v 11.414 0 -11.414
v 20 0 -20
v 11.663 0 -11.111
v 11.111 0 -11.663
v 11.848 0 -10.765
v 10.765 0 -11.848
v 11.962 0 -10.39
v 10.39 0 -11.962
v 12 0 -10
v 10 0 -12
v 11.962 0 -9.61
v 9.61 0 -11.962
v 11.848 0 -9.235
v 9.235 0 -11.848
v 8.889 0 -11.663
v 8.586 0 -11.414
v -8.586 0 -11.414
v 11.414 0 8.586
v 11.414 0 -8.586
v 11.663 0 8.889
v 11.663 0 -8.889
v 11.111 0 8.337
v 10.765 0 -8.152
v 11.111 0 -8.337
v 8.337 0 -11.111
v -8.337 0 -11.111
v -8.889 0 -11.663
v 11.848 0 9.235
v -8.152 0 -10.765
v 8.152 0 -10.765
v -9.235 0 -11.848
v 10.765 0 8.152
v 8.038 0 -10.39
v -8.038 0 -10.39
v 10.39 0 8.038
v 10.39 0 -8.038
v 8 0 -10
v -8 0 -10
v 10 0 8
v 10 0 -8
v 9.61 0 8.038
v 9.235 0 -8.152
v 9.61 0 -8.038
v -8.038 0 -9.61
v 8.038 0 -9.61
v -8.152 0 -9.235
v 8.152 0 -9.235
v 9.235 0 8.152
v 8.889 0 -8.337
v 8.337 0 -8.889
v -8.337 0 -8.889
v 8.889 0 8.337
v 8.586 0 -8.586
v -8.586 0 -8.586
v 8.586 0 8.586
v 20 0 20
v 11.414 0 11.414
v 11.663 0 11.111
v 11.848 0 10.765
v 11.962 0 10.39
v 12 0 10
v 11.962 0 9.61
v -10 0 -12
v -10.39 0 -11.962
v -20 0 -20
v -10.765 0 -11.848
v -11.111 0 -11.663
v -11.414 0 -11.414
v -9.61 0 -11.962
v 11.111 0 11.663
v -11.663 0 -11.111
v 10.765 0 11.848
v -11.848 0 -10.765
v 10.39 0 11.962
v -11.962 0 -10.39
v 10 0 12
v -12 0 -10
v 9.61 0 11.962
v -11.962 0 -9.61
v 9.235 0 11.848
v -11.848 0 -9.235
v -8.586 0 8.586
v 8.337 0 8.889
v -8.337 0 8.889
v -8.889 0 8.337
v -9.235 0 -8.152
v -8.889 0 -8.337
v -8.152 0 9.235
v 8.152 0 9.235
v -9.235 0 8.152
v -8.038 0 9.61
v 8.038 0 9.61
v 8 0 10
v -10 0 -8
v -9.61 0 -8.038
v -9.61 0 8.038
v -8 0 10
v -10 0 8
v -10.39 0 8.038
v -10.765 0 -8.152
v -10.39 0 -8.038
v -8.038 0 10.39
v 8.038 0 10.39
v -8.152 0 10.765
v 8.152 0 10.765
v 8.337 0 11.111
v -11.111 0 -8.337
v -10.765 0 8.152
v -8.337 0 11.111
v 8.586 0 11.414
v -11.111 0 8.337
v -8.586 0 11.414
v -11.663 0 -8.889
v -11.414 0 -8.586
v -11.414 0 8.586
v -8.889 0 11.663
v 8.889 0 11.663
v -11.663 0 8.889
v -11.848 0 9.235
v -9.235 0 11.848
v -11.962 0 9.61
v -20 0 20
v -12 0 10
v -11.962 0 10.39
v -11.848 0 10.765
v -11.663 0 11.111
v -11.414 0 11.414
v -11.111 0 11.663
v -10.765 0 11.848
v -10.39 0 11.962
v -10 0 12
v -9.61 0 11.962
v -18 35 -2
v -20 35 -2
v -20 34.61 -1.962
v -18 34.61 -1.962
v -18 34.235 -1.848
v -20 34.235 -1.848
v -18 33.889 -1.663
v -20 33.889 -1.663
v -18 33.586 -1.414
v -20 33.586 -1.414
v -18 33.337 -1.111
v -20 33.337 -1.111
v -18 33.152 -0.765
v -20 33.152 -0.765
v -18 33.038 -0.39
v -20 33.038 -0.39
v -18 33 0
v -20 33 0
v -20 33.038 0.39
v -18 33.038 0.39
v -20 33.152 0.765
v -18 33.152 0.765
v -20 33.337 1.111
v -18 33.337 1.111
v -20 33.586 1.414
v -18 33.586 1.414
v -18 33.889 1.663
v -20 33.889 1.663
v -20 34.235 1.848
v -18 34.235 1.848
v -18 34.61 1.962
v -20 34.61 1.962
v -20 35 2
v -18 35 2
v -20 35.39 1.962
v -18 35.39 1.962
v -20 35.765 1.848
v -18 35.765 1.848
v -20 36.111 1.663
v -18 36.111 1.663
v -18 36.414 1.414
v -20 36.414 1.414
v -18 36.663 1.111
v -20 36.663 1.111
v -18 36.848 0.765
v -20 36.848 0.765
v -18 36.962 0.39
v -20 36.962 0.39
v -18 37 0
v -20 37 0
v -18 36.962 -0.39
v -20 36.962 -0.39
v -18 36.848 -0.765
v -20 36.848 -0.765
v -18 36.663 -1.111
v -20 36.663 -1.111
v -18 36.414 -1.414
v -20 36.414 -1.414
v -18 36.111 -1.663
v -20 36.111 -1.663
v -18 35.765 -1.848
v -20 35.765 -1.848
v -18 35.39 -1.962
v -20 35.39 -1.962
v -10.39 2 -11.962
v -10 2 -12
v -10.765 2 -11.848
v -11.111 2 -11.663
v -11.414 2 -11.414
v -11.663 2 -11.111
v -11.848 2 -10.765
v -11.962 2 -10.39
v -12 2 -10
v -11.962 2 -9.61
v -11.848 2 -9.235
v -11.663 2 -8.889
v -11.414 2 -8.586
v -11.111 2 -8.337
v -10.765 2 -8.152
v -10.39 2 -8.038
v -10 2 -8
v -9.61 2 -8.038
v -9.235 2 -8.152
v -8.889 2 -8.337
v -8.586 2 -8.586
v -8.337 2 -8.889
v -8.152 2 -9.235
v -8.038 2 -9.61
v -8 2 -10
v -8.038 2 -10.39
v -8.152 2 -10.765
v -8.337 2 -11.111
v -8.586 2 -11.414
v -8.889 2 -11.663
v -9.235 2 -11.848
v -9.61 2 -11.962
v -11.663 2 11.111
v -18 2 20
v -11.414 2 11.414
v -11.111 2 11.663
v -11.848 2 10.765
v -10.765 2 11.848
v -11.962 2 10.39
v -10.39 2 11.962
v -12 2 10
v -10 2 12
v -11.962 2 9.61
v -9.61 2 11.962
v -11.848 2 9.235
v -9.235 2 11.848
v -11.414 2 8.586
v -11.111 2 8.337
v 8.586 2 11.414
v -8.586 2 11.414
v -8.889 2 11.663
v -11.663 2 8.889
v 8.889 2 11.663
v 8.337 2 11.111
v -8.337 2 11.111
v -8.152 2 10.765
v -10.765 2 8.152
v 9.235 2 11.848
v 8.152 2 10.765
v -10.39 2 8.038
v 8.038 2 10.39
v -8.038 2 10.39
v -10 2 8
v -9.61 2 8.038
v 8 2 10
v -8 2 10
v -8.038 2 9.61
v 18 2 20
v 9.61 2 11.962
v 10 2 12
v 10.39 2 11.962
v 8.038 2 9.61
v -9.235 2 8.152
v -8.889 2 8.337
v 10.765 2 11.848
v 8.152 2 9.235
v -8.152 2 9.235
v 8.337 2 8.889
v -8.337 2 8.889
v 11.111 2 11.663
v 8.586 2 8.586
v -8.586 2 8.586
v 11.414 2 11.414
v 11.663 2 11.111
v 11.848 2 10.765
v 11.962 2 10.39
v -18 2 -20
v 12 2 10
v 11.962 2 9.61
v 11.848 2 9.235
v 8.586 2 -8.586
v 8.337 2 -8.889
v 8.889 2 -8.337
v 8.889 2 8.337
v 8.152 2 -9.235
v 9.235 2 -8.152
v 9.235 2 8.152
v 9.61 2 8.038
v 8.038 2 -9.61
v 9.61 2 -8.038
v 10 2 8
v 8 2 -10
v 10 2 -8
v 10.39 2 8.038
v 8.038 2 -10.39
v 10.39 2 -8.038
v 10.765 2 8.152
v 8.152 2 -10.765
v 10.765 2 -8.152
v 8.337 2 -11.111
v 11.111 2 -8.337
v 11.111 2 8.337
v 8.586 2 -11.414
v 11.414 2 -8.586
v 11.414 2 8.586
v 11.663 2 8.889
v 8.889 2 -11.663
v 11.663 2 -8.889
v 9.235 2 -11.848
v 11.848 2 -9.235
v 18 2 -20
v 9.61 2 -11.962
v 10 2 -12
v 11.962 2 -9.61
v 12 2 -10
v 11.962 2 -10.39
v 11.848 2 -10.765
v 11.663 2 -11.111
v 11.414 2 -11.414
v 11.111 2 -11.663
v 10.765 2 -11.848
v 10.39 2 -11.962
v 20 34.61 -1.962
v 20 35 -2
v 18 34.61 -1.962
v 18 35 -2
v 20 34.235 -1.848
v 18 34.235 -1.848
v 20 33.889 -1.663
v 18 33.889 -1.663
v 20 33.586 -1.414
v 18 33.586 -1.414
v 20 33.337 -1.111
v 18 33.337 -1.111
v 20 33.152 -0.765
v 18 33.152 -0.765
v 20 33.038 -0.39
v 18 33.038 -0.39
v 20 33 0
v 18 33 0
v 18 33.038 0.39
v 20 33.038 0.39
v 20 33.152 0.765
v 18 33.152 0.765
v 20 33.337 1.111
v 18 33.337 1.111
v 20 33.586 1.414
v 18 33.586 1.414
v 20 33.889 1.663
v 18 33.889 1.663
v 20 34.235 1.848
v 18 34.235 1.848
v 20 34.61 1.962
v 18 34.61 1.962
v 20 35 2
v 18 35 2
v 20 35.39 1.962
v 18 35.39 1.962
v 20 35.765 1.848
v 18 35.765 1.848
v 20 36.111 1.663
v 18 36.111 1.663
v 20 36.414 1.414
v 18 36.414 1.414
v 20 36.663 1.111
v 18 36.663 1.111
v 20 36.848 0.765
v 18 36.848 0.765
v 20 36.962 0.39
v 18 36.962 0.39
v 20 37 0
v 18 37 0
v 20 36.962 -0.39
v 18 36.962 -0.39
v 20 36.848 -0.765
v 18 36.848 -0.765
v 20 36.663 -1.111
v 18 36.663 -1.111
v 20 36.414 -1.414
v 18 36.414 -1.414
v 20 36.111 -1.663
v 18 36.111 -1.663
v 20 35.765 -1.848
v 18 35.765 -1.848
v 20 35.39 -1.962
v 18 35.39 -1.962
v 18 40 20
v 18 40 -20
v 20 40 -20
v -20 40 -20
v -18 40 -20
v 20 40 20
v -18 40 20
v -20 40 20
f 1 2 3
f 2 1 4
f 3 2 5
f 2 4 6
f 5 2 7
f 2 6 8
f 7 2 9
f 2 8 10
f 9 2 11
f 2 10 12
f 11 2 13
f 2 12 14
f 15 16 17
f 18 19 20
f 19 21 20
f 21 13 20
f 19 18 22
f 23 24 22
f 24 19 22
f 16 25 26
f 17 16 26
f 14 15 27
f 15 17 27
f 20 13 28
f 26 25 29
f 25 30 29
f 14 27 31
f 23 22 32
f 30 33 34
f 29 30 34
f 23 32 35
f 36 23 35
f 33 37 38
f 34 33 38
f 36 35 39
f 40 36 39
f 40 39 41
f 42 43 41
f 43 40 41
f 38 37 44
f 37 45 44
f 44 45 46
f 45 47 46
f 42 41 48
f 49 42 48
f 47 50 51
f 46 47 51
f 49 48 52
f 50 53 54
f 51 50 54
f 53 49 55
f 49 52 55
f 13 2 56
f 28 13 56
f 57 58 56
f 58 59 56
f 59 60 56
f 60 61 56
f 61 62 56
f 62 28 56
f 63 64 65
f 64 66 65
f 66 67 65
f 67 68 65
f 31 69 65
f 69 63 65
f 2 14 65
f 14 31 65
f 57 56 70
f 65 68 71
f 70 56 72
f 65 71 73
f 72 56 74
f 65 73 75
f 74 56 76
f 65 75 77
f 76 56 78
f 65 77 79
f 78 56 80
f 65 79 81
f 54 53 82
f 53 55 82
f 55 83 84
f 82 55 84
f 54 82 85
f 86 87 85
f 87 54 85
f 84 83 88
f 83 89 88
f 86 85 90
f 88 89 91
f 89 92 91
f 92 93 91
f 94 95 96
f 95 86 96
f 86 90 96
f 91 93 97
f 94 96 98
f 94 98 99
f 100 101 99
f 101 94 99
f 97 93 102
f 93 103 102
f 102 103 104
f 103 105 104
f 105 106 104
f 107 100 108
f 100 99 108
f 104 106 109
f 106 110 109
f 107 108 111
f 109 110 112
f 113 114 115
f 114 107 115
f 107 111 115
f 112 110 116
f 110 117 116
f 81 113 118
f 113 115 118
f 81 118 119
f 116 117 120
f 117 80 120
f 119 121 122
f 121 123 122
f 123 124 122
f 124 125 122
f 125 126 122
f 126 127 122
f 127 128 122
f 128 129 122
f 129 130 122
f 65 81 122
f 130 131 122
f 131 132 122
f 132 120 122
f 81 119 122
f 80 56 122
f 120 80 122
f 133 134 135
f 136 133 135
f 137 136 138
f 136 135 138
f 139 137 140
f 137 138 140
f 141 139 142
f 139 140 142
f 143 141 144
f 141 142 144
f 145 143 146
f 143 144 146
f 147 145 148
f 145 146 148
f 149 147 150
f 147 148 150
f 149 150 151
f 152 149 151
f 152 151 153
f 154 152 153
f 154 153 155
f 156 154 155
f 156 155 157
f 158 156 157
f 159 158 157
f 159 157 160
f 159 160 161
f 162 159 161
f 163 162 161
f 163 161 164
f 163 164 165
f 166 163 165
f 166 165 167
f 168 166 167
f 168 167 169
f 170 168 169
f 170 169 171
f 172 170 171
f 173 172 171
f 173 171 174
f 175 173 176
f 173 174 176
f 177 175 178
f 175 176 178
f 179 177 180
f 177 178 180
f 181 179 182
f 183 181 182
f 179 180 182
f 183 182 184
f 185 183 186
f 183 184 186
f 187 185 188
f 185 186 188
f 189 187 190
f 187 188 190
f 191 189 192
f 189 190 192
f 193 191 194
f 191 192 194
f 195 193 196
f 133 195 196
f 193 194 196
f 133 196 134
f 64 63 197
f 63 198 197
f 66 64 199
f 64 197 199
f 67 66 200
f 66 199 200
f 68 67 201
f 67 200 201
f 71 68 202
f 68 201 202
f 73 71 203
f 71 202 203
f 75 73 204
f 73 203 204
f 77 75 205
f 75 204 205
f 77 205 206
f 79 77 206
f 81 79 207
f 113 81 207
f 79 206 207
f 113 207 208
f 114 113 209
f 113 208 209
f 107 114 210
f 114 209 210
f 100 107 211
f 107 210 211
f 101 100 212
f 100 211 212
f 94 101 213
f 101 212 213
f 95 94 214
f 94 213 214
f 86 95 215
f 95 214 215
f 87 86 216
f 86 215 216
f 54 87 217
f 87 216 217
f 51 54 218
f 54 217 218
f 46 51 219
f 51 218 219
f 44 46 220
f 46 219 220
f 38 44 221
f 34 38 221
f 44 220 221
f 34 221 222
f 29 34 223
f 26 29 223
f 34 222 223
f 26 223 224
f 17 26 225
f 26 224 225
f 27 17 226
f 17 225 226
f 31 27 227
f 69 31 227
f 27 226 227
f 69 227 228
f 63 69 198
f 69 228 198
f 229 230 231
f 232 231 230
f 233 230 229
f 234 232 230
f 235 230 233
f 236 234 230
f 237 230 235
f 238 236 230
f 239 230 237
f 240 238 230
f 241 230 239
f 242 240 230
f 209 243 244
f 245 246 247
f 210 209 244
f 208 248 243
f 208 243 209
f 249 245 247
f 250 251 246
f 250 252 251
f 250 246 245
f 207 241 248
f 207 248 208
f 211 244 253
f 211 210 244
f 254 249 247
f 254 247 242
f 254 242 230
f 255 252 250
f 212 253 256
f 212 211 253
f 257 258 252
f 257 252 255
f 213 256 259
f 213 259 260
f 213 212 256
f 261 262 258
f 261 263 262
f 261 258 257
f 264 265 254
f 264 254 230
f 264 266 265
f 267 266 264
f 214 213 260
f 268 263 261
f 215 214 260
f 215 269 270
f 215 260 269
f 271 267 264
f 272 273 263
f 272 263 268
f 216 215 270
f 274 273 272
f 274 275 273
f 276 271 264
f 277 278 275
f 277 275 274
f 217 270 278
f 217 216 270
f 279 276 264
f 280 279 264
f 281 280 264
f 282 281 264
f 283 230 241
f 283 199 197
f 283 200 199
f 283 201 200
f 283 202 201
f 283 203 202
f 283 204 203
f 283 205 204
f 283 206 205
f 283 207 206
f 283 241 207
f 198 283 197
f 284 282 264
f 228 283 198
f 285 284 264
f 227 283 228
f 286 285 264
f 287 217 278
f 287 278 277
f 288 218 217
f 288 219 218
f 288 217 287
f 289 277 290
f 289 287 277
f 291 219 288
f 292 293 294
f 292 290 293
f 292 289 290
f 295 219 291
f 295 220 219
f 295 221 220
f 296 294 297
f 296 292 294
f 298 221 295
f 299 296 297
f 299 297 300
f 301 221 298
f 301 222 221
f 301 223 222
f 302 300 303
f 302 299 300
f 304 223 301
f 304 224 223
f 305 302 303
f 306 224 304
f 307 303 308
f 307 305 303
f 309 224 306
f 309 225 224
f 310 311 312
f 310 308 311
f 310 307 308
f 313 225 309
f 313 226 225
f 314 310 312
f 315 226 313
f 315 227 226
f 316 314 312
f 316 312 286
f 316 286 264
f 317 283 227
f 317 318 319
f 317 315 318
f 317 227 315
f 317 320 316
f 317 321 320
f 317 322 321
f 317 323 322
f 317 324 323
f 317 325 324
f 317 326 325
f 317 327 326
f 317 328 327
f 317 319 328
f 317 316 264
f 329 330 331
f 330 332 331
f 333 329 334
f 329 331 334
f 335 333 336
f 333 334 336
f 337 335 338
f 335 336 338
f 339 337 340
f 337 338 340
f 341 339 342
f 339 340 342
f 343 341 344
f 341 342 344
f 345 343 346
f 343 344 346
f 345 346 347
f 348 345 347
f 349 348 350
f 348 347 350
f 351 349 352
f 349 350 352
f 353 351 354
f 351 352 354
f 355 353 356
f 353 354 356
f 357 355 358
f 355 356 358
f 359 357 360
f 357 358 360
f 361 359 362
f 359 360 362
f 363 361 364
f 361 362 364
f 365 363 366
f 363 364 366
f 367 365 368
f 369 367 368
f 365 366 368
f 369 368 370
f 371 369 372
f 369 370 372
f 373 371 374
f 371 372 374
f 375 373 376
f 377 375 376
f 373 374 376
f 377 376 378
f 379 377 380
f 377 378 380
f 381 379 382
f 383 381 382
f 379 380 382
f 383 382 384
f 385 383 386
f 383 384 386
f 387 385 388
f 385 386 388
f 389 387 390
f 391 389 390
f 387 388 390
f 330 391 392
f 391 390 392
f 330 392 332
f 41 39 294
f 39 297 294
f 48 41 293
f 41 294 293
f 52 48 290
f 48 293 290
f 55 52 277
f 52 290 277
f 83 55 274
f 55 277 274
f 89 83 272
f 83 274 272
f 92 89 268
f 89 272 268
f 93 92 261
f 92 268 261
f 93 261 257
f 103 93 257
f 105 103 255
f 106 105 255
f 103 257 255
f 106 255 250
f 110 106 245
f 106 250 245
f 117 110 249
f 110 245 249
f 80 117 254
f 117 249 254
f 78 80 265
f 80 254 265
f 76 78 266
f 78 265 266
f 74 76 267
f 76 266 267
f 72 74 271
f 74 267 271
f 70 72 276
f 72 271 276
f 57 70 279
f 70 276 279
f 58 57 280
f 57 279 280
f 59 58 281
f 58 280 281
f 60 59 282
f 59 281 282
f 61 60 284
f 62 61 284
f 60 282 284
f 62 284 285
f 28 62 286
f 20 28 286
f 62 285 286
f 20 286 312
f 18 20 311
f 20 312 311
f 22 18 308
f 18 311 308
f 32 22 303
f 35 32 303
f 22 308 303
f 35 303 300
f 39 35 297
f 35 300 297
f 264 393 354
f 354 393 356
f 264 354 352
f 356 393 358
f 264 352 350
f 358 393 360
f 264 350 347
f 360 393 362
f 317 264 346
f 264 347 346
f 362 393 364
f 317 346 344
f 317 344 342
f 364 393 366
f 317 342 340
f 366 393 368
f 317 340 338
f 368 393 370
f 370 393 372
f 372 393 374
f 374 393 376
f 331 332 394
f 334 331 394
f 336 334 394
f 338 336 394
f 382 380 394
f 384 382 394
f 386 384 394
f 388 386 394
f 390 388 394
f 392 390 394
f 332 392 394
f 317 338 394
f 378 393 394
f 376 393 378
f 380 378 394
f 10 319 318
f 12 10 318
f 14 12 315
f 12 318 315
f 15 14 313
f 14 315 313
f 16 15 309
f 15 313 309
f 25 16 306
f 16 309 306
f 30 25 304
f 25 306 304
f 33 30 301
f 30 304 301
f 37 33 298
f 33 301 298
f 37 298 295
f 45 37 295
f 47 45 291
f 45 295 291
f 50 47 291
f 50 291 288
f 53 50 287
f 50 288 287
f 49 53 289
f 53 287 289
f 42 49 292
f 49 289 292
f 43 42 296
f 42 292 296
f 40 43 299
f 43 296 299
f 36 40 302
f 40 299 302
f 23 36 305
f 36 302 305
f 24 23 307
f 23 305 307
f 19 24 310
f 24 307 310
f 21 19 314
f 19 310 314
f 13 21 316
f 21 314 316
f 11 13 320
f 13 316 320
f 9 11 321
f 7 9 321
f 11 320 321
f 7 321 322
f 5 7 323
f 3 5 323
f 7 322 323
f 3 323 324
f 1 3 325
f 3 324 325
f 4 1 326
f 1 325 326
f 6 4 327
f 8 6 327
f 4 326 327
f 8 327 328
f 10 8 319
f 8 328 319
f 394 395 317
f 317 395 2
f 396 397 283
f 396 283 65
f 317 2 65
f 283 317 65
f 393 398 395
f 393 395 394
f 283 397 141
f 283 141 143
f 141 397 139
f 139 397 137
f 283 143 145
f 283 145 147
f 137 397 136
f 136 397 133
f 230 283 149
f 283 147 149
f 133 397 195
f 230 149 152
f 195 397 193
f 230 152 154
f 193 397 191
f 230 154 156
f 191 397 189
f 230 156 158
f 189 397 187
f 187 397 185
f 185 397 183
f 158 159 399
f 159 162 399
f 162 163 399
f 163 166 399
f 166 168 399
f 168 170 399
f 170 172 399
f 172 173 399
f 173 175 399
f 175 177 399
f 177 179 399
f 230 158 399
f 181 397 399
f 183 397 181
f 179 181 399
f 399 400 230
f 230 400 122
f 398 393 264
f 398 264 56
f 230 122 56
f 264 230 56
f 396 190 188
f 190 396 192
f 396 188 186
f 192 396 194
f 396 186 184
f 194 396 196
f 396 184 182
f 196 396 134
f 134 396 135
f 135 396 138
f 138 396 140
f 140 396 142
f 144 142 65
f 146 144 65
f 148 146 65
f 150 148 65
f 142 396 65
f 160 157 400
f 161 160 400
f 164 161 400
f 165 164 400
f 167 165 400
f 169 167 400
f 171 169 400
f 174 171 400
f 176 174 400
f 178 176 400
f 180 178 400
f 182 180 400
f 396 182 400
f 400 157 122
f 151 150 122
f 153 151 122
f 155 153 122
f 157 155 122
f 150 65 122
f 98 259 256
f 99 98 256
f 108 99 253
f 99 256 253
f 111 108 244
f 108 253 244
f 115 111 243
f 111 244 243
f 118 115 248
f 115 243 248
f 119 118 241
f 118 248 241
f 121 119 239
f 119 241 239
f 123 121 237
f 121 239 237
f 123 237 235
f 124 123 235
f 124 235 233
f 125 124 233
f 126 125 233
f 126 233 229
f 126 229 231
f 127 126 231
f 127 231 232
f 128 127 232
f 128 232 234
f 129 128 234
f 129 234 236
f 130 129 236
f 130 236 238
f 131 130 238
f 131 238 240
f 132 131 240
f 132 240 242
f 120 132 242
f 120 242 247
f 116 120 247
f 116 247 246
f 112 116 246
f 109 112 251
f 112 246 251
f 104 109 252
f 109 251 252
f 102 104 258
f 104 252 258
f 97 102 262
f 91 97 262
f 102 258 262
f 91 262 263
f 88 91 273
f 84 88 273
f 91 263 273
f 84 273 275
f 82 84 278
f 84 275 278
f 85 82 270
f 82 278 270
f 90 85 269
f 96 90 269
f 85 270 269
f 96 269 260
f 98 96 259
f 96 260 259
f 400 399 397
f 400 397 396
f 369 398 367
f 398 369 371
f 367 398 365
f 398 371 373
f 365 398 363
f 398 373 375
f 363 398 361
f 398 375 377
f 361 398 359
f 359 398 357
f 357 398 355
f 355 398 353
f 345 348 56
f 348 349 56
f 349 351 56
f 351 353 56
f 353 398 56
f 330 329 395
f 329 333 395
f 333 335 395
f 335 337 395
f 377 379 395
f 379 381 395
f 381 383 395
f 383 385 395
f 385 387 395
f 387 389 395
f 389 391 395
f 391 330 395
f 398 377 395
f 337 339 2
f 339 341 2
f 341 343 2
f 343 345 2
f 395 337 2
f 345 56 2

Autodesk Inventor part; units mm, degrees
ref_plane "YZ Plane" through (0, 0, 0) normal (1, 0, 0) x (0, 1, 0)
ref_plane "XZ Plane" through (0, 0, 0) normal (0, 1, 0) x (-1, 0, 0)
ref_plane "XY Plane" through (0, 0, 0) normal (0, 0, 1) x (1, 0, 0)
sketch "スケッチ1" plane through (0, 0, 0) normal (0, 1, 0) x (-1, 0, 0)
  line L0 (20, 20) -> (-20, 20)
  line L1 (-20, 20) -> (-20, -20)
  line L2 (-20, -20) -> (20, -20)
  line L3 (20, -20) -> (20, 20)
  line L4 (20, 20) -> (-20, -20) construction
  line L5 (-20, 20) -> (20, -20) construction
  point P0 (0, 0)
  dimension "d0" = 40
  dimension "d1" = 40
extrude "押し出し1" add sketch "スケッチ1" along normal blind 40
sketch "スケッチ2" plane through (0, 40, 0) normal (0, 1, 0) x (1, 0, 0)
  line L0 (20, 20) -> (-20, 20) projected
  line L1 (-18, -20) -> (18, -20)
  line L2 (18, -20) -> (18, 20)
  line L3 (18, 20) -> (-18, 20)
  line L4 (-18, 20) -> (-18, -20)
  line L5 (-18, -20) -> (18, 20) construction
  line L6 (18, -20) -> (-18, 20) construction
  point P0 (0, 0)
  dimension "d4" = 36
extrude "押し出し2" cut sketch "スケッチ2" against normal blind 38
sketch "スケッチ3" plane through (0, 0, 0) normal (0, -1, 0) x (1, 0, 0)
  line L0 (-20, 20) -> (20, 20) projected
  line L1 (20, 20) -> (20, -20) projected
  point P0 (0, 0)
  point P1 (10, 10)
  point P2 (10, -10)
  point P3 (-10, 10)
  point P4 (-10, -10)
  dimension "d7" = 10
  dimension "d8" = 10
  dimension "d11" = 20
  dimension "d14" = 20
hole "穴1" at (10, 0, 10) at (10, 0, -10) at (-10, 0, 10) at (-10, 0, -10) direction (0, 1, 0) diameter 4 end through all
sketch "スケッチ4" plane through (20, 0, 20) normal (1, 0, 0) x (0, 0, -1)
  line L0 (0, 40) -> (40, 40) projected
  line L1 (0, 0) -> (0, 40) projected
  point P0 (20, 0)
  point P1 (20, 35)
  dimension "d24" = 5
  dimension "d25" = 20
hole "穴2" at (20, 35, 0) direction (-1, 0, 0) diameter 4 end through all
properties part number "blaket_1"
